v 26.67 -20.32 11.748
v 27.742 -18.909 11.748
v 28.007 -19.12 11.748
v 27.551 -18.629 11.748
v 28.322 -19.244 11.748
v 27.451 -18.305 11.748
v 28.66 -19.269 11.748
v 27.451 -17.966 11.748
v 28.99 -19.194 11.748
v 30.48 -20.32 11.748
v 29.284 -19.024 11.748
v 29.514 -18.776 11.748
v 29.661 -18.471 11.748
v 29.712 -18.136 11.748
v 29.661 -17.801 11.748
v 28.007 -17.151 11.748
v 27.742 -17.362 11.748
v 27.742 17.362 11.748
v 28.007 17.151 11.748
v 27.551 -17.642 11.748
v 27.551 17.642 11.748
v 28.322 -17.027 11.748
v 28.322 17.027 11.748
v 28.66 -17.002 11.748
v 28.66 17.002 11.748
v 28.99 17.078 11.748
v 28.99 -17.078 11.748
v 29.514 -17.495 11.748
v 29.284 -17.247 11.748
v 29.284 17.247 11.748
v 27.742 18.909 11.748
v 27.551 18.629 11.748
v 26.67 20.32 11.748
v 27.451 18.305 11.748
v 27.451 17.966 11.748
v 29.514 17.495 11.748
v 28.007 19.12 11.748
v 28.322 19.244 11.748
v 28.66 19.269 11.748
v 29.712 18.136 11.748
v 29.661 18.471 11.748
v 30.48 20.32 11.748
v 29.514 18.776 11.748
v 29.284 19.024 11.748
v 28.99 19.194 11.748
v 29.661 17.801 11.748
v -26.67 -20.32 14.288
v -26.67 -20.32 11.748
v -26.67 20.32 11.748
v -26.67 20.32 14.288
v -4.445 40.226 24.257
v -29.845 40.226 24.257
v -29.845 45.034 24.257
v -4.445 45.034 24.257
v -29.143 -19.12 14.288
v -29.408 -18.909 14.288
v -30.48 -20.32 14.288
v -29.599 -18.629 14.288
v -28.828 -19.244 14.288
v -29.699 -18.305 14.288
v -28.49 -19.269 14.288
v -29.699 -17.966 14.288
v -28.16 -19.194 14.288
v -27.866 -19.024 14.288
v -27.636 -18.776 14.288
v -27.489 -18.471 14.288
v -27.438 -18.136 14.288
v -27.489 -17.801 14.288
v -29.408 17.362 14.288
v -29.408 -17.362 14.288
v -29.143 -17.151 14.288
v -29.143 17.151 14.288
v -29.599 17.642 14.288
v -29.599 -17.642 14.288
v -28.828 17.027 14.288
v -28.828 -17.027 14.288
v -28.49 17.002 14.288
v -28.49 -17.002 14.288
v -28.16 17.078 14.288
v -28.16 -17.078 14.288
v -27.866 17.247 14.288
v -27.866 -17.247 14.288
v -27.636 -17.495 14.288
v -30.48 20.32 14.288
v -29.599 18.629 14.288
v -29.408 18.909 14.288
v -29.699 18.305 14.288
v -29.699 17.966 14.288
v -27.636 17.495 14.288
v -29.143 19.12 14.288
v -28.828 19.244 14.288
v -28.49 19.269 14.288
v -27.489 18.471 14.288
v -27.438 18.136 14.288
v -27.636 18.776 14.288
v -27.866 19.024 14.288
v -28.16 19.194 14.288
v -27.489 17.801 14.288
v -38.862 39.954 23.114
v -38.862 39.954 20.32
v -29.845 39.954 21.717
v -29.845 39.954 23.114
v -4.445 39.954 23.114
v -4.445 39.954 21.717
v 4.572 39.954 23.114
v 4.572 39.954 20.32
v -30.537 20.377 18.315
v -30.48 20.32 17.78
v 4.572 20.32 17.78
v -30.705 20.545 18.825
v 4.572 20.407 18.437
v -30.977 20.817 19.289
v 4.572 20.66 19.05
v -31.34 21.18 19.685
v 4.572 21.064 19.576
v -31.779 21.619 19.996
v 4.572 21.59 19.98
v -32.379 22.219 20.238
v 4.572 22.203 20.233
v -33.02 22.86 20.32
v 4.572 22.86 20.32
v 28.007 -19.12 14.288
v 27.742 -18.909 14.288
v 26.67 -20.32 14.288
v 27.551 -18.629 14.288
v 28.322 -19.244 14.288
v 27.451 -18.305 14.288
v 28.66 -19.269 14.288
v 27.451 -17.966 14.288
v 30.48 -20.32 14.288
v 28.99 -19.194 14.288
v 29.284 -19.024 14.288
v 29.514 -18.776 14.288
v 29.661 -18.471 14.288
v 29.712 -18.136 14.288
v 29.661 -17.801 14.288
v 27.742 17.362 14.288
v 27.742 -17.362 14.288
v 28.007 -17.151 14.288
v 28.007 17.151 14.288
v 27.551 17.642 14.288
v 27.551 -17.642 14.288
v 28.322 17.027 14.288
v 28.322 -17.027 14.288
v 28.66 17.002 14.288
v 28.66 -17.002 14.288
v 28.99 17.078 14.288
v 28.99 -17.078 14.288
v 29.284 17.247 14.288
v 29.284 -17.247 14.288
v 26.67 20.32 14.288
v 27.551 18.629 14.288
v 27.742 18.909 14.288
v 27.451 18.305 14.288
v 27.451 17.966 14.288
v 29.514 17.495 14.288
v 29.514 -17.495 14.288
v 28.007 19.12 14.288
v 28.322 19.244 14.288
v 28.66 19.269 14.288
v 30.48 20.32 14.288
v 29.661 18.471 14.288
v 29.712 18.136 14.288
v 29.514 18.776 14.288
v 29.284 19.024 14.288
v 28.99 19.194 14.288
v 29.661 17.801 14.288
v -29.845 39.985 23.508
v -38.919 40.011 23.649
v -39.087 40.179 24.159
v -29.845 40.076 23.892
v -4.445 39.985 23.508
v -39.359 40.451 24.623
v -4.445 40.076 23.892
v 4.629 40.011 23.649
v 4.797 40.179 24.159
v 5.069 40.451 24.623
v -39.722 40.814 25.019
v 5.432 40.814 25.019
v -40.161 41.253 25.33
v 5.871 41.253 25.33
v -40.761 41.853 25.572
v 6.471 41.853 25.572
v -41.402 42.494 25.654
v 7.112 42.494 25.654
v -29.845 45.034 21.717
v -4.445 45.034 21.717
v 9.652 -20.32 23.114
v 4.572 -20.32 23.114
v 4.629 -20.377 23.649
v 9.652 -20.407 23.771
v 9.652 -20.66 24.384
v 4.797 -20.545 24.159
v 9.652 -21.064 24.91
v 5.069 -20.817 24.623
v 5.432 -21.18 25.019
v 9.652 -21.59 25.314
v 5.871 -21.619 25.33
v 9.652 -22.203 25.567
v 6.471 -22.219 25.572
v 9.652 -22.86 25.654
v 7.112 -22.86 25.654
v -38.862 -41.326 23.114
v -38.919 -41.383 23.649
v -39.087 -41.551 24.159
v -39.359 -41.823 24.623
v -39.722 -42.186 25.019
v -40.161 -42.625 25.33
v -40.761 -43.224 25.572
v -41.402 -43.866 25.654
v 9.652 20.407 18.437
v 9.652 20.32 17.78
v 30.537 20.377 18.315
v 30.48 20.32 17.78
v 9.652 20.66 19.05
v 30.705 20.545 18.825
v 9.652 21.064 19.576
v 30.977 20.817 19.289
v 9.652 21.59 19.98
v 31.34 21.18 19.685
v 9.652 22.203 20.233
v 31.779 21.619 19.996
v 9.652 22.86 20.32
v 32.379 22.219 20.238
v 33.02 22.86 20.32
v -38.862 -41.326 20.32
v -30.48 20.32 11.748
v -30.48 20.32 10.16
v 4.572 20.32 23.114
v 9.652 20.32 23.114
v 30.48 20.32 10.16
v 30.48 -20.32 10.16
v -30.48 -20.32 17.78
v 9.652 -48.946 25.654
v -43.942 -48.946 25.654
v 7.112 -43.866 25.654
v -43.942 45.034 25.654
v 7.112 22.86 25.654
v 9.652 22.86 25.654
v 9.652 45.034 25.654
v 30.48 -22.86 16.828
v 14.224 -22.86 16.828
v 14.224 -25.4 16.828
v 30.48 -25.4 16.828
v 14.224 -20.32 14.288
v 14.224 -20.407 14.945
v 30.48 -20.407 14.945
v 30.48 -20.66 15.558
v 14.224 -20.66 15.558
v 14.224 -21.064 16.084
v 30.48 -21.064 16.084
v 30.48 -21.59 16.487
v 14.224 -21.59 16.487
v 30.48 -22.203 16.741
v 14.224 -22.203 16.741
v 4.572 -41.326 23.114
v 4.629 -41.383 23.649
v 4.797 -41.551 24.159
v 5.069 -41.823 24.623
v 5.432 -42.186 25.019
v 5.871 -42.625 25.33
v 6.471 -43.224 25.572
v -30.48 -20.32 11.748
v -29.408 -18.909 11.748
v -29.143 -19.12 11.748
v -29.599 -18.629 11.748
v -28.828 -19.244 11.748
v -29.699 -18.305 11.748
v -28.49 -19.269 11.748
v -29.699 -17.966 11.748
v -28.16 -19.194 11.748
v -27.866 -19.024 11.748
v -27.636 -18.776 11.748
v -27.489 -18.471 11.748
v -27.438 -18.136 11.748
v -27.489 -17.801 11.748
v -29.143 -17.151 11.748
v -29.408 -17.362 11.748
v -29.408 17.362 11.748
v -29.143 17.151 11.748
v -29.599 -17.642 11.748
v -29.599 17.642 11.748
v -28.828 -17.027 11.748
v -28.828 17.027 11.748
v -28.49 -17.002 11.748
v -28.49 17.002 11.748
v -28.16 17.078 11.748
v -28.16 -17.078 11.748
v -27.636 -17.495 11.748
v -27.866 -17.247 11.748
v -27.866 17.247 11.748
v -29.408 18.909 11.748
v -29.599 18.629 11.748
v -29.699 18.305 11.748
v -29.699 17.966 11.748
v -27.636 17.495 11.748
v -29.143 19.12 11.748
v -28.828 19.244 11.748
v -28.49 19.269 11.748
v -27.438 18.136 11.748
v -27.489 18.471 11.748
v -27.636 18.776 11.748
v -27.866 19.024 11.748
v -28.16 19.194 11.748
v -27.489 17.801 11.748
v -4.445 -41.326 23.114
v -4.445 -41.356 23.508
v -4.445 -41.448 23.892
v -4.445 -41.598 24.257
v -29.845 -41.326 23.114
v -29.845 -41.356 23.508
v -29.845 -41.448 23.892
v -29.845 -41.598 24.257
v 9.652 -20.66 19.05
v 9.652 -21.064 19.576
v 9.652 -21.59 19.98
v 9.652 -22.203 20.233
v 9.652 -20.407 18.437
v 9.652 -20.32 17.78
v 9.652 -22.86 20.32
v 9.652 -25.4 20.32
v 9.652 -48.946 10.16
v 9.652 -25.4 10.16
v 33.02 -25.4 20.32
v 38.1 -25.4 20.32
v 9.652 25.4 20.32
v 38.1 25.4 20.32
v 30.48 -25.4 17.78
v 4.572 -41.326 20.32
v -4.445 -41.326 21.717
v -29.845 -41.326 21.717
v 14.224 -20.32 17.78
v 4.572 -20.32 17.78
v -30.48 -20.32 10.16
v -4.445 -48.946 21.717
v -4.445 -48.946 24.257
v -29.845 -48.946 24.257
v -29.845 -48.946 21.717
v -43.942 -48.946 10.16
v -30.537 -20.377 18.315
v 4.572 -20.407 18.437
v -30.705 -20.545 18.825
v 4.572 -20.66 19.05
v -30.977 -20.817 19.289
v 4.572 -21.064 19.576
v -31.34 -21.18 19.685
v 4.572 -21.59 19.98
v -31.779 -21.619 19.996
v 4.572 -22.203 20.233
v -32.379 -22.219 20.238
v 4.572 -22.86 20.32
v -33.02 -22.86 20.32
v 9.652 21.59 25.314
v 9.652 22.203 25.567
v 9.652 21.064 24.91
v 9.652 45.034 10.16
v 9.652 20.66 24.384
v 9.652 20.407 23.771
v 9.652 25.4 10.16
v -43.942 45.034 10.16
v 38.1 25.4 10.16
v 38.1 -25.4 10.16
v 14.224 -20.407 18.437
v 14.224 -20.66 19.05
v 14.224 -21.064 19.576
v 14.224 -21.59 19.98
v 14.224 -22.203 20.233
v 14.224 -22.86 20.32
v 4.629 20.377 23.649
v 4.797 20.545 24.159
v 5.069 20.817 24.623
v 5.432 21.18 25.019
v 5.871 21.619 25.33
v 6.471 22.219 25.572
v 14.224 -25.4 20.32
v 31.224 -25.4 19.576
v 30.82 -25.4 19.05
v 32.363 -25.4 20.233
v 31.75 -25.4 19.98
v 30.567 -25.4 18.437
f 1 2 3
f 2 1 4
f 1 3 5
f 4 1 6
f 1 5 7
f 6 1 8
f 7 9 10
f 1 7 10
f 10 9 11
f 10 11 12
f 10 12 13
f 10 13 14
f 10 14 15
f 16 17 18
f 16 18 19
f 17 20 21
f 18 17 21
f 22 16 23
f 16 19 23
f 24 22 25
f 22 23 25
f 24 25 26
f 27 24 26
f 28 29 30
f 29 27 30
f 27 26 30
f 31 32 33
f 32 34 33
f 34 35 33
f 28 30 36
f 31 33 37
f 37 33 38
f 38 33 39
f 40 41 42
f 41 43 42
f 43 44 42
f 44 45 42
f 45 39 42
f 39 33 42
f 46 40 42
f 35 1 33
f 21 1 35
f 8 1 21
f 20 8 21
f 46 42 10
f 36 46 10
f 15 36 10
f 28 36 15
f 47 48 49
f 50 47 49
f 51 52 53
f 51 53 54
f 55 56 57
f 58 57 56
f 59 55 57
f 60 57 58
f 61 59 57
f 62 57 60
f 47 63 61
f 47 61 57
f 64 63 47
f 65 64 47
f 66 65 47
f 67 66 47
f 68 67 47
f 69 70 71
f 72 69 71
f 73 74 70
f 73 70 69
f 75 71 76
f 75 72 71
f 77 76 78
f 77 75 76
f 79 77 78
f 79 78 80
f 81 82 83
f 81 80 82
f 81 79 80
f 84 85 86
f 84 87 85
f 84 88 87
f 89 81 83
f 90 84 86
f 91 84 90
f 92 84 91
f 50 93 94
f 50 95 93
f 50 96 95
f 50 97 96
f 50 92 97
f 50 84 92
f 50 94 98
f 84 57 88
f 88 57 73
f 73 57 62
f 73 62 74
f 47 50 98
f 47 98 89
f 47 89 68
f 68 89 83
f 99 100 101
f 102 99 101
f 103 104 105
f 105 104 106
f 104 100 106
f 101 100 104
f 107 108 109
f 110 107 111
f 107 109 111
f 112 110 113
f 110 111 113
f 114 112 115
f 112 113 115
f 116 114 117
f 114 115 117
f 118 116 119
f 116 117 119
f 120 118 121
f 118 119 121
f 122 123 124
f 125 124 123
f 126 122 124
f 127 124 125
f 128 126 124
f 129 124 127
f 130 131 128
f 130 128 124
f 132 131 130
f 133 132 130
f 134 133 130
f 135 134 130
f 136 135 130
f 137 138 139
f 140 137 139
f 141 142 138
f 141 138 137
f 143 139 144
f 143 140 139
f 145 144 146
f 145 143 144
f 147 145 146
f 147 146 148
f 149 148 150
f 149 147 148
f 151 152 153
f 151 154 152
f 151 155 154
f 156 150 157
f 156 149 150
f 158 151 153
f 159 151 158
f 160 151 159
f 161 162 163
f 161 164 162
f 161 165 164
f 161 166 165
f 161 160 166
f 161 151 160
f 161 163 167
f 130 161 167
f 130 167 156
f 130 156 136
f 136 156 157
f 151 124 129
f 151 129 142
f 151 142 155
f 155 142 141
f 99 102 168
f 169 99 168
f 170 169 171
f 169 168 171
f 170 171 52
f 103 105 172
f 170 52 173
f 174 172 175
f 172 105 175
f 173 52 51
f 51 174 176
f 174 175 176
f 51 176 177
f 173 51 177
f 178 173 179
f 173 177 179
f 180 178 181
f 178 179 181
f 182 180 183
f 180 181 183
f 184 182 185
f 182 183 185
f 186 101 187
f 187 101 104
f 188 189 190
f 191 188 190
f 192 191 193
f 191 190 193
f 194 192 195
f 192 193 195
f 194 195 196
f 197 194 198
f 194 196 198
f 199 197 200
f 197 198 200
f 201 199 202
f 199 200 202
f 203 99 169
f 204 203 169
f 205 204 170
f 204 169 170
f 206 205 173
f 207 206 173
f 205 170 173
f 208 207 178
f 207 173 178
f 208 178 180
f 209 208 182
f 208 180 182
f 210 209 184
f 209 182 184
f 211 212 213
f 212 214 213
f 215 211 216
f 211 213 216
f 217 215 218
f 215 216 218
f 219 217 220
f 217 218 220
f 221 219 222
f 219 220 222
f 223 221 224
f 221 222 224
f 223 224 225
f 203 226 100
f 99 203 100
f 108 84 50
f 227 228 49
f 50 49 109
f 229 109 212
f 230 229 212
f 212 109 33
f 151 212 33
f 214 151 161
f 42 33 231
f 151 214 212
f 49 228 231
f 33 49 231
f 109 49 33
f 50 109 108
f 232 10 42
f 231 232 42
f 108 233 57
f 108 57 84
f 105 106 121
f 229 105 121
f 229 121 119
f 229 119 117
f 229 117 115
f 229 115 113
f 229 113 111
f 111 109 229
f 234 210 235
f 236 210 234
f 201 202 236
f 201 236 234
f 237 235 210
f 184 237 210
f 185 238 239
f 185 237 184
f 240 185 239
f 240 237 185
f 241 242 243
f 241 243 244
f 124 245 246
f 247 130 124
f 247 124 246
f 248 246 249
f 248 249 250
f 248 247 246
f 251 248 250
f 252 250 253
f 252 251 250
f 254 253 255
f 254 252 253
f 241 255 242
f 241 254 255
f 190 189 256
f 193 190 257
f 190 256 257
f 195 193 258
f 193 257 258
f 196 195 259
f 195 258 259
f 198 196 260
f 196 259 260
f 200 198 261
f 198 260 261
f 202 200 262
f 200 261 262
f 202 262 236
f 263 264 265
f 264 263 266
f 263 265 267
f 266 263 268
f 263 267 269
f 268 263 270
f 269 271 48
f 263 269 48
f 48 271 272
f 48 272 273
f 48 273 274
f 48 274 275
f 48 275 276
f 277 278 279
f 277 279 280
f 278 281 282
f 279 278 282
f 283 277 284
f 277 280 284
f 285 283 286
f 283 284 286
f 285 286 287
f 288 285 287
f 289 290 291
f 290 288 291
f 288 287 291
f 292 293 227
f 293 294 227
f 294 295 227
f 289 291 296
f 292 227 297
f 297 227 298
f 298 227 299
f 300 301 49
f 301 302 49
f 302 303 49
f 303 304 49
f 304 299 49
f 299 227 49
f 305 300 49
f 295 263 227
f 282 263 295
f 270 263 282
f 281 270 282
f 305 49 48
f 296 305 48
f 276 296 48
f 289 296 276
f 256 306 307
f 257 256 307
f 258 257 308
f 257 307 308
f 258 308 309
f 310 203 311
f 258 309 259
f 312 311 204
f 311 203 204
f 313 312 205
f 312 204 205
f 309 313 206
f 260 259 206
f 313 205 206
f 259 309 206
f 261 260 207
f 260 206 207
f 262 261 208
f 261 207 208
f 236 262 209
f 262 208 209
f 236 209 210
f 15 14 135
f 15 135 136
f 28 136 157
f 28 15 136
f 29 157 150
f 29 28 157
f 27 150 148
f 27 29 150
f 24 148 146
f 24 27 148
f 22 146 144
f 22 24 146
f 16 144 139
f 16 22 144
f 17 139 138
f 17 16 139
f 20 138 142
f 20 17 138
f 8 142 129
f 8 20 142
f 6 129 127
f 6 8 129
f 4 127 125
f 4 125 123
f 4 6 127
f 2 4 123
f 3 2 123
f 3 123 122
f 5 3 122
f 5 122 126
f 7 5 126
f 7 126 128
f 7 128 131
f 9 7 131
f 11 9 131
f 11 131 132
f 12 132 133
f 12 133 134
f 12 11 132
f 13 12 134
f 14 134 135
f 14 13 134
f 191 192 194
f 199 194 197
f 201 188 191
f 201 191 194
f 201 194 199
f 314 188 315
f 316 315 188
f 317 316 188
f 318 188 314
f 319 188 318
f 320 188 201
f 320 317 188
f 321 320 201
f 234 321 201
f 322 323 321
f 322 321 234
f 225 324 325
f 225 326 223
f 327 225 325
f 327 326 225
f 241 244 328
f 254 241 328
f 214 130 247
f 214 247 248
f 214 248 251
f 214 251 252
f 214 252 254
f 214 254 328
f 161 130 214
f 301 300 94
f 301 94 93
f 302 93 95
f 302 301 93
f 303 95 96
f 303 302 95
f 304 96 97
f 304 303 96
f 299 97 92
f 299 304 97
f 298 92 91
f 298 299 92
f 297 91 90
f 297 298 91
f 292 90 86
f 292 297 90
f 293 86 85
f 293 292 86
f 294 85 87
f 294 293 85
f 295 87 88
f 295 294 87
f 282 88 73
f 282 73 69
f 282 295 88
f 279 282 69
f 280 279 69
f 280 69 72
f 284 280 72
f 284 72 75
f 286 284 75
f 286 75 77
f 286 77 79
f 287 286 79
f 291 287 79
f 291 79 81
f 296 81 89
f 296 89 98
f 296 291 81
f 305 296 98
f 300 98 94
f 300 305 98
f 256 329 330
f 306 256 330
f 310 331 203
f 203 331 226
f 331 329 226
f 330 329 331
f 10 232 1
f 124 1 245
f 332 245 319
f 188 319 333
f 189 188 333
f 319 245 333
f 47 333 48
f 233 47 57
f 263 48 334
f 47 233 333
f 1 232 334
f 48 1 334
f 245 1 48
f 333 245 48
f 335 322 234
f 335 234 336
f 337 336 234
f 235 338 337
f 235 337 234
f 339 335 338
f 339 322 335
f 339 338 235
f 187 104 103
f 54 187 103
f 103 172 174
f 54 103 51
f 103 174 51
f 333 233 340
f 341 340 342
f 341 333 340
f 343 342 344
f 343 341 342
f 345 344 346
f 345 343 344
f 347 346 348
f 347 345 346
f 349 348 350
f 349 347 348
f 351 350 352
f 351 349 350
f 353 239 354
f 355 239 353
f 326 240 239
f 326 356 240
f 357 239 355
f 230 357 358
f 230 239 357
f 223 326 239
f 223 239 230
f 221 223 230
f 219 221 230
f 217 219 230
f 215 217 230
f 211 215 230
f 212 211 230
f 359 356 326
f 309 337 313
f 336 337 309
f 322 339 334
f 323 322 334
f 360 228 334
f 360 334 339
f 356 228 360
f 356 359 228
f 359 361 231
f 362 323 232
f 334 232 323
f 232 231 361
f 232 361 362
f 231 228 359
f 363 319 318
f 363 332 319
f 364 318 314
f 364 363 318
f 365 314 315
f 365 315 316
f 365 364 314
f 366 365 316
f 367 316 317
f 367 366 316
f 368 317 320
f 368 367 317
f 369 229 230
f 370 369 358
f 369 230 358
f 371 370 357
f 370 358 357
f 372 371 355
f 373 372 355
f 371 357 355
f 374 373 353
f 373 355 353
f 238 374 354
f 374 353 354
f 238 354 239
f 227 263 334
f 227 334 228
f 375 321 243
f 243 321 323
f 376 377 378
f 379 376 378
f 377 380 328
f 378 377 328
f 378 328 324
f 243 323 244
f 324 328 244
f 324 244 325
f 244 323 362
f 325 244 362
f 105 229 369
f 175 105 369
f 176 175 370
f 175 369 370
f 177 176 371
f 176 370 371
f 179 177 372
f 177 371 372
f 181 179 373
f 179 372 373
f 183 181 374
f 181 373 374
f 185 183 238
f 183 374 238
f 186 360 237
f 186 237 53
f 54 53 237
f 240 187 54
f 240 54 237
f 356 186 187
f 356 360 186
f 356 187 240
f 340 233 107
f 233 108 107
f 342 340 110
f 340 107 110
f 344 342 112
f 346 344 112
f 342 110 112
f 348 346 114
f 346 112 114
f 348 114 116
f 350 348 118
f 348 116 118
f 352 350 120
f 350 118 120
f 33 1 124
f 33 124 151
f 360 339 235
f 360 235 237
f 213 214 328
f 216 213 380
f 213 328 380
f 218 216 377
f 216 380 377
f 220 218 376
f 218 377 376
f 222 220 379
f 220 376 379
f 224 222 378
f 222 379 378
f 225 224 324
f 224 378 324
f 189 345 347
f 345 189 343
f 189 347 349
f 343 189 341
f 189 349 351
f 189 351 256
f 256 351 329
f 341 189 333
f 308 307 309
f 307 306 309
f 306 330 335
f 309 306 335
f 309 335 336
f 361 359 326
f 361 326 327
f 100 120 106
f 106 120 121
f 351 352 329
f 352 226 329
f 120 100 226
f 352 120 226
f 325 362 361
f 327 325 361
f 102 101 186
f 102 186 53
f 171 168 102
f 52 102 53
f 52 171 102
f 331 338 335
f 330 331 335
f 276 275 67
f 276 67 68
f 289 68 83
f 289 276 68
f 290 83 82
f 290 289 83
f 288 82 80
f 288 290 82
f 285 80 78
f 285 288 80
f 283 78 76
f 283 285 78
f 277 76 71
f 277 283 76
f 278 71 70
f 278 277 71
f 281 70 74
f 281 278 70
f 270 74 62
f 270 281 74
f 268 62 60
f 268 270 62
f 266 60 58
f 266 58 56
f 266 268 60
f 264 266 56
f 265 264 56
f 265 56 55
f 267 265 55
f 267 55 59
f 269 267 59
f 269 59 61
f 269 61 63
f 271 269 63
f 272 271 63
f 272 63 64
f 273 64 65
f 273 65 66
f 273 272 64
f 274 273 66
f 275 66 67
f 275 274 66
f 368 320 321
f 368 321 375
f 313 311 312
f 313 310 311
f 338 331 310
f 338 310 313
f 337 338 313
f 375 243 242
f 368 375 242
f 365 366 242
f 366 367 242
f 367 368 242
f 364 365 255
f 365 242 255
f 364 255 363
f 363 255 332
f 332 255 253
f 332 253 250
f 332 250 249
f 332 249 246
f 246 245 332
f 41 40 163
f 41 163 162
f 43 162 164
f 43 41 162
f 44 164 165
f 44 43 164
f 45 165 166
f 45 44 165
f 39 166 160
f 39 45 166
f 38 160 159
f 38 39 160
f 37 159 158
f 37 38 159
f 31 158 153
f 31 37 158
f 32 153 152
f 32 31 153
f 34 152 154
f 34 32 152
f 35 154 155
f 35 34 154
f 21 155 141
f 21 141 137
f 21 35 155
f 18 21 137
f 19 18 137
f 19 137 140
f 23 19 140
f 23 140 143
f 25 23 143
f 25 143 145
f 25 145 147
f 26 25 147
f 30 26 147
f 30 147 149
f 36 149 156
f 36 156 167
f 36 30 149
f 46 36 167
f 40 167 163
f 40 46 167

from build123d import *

# Parameters (mm, degrees)
F0_W      = 76.2
F0_H      = 50.8
F1_DEPTH  = 20.32
F2_W      = 60.96
F2_H      = 40.64
F3_DEPTH  = 17.272
F5_W      = 3.81
F5_H      = 40.64
F5_R      = 1.13665
F6_DEPTH  = 2.54
F8_W      = 16.256
F8_H      = 5.08
F9_DEPTH  = 3.4925
F11_DEPTH = 5.334
F13_DEPTH = 20.32
F14_R     = 2.54
F15_W     = 93.98
F15_H     = 10.16
F16_DEPTH = 82.042
F17_W     = 25.4
F17_H     = 2.54
F18_DEPTH = 93.98


with BuildPart() as f1:
    # F0 (on Top) → F1 (new body)
    with BuildSketch(Plane.XY):
        Rectangle(F0_W, F0_H)
    extrude(amount=F1_DEPTH)

    # F2 (on face) → F3 (cut)
    with BuildSketch(Plane.XY.offset(20.32)):
        Rectangle(F2_W, F2_H)
    extrude(amount=-F3_DEPTH, mode=Mode.SUBTRACT)

    # F5 (on offset) → F6 (join)
    with BuildSketch(Plane.XY.offset(11.7475)):
        with Locations((-28.575, 0)):
            Rectangle(F5_W, F5_H)
        with Locations((-28.575, -18.1356)):
            Circle(F5_R, mode=Mode.SUBTRACT)
        with Locations((-28.575, 18.1356)):
            Circle(F5_R, mode=Mode.SUBTRACT)
        with Locations((28.575, 0)):
            Rectangle(F5_W, F5_H)
        with Locations((28.575, -18.1356)):
            Circle(F5_R, mode=Mode.SUBTRACT)
        with Locations((28.575, 18.1356)):
            Circle(F5_R, mode=Mode.SUBTRACT)
    extrude(amount=F6_DEPTH)

    # F8 (on offset) → F9 (cut, through all)
    with BuildSketch(Plane.XY.offset(16.8275)):
        with Locations((22.352, -22.86)):
            Rectangle(F8_W, F8_H)
    extrude(amount=F9_DEPTH, mode=Mode.SUBTRACT)

    # F10 (on face) → F11 (join)
    with BuildSketch(Plane.XY.offset(20.32)):
        Polygon((-38.862, -41.3258), (-38.862, 39.9542), (4.572, 39.9542), (4.572, 20.32), (9.652, 20.32), (9.652, 45.0342), (-43.942, 45.0342), (-43.942, -48.9458), (9.652, -48.9458), (9.652, -20.32), (4.572, -20.32), (4.572, -41.3258), align=None)
    extrude(amount=F11_DEPTH)

    # F12 (on face) → F13 (join, through all)
    with BuildSketch(Plane(origin=(0, 0, 0), x_dir=(1, 0, 0), z_dir=(0, 0, -1))):
        Polygon((-43.942, 48.9458), (-43.942, -45.0342), (9.652, -45.0342), (9.652, -25.4), (-38.1, -25.4), (-38.1, 25.4), (9.652, 25.4), (9.652, 48.9458), align=None)
    extrude(amount=-F13_DEPTH)

    # F14
    f14_edges = [f1.edges().sort_by_distance(p)[0] for p in [
        (-12.954, 20.32, 20.32),
        (-30.48, 0, 20.32),
        (30.48, -2.54, 20.32),
        (-17.145, 39.9542, 25.654),
        (-38.862, -0.6858, 25.654),
        (-17.145, -41.3258, 25.654),
        (4.572, -30.8229, 25.654),
        (4.572, 30.1371, 25.654),
        (22.352, -20.32, 16.8275),
        (11.938, -20.32, 20.32),
        (-12.954, -20.32, 20.32),
        (20.066, 20.32, 20.32),
        (7.112, 20.32, 25.654),
        (7.112, -20.32, 25.654),
    ]]
    fillet(f14_edges, radius=F14_R)

    # F15 (on face) → F16 (cut, through all)
    with BuildSketch(Plane.YZ.offset(38.1)):
        with Locations((-1.9558, 5.08)):
            Rectangle(F15_W, F15_H)
    extrude(amount=-F16_DEPTH, mode=Mode.SUBTRACT)

    # F17 (on face) → F18 (cut, through all)
    with BuildSketch(Plane.XZ.offset(48.9458)):
        with Locations((-17.145, 22.987)):
            Rectangle(F17_W, F17_H)
    extrude(amount=-F18_DEPTH, mode=Mode.SUBTRACT)


solid = f1.part
